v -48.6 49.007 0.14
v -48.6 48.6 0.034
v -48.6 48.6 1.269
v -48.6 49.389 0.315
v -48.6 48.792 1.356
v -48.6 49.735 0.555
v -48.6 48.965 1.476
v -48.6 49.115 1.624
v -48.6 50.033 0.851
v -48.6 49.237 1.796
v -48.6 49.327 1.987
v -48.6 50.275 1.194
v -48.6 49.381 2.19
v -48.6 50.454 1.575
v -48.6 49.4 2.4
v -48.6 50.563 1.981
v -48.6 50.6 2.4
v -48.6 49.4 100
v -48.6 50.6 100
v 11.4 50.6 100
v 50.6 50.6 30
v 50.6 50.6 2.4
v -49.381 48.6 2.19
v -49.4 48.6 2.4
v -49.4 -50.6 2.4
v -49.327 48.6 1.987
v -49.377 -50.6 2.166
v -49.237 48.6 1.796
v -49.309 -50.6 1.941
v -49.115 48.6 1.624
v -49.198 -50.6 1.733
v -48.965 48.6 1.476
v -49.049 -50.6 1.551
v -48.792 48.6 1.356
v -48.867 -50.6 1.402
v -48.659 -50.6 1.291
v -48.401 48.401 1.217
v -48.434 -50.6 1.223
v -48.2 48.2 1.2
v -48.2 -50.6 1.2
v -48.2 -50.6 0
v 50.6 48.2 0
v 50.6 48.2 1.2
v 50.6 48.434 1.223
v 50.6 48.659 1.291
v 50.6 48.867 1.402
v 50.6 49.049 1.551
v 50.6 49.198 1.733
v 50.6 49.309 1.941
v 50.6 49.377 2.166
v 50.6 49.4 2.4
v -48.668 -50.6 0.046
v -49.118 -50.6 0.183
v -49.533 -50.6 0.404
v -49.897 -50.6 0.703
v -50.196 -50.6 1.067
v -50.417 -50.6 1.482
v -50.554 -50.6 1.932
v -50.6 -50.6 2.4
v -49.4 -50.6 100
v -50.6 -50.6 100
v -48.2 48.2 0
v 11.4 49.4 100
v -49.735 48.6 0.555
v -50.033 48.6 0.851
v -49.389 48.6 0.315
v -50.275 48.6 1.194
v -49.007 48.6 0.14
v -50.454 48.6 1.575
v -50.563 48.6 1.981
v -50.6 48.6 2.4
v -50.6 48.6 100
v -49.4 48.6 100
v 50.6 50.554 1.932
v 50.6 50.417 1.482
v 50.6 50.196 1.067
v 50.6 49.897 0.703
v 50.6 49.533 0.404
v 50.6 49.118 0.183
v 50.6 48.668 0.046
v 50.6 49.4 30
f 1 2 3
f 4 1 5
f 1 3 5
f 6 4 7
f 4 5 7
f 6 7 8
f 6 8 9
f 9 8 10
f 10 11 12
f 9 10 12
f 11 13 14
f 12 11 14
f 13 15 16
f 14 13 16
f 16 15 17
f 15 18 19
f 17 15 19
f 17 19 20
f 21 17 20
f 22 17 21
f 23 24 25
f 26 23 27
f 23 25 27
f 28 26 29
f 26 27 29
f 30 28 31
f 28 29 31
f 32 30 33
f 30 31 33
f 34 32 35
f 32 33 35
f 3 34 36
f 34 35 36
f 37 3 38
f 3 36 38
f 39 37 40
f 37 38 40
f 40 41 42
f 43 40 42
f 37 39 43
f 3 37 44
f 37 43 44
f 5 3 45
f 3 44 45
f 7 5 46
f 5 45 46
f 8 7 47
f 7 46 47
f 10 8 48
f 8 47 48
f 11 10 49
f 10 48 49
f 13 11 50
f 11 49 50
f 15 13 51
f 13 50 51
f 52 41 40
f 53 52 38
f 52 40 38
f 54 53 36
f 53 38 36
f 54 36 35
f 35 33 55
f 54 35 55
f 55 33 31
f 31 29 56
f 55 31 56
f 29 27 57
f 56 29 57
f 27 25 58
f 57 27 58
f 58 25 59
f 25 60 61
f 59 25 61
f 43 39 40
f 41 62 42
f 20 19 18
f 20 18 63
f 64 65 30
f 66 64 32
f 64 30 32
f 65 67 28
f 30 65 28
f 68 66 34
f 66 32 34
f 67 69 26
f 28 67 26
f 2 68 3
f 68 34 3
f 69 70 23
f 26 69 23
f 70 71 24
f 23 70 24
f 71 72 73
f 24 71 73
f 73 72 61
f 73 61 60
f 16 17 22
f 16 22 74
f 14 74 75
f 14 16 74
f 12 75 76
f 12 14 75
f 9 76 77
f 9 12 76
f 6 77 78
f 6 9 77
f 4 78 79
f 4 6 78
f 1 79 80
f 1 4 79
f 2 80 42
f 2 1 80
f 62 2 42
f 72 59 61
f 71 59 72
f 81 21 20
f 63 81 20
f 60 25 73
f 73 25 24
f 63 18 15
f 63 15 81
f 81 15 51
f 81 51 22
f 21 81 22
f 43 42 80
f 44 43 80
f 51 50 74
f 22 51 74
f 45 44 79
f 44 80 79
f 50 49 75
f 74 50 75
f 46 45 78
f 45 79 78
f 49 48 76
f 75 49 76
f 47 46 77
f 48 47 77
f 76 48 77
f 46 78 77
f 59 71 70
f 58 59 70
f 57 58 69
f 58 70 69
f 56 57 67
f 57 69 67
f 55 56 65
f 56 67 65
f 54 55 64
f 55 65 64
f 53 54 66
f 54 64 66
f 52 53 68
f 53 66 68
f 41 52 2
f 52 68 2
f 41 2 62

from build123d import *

# Parameters (mm, degrees)
F0_W        = 101.2
F0_H        = 101.2
F1_DEPTH    = 100
F2_T        = -1.2
F4_W        = 0.8
F4_H        = 0.8
F5_DEPTH    = 100.001
F6_R        = 1.2
F7_T4_DEPTH = 101.8
F8_R        = 2.4
F9_T1_DEPTH = 110.8
F12_DEPTH   = 25
F14_DEPTH   = 25


# Not quite as in the source:
# - a fillet or chamfer that OpenCascade refuses, or shapes differently, is made with other operations: its cross-section is extruded or revolved along the edge and cut away or added


with BuildPart() as f1:
    # F0 (on Top) → F1 (new body)
    with BuildSketch(Plane.XY):
        Rectangle(F0_W, F0_H)
    extrude(amount=F1_DEPTH)

    # F2
    f2_openings = [f1.faces().sort_by_distance(p)[0] for p in [
        (0, 0, 100),
        (0, -50.6, 50),
        (50.6, 0, 50),
    ]]
    offset(amount=F2_T, openings=f2_openings)

    # F4 (on face) → F5 (cut, through all)
    with BuildSketch(Plane.XY.offset(100)):
        with Locations((-49, 49)):
            Rectangle(F4_W, F4_H)
        Polygon((-50.6, 50.6), (-50.6, 48.6), (-49.4, 48.6), (-49.4, 49.4), (-48.6, 49.4), (-48.6, 50.6), align=None)
    extrude(amount=-F5_DEPTH, mode=Mode.SUBTRACT)

    # F6
    f6_edges = [f1.edges().sort_by_distance(p)[0] for p in [
        (1, 49.4, 1.2),
    ]]
    fillet(f6_edges, radius=F6_R)

    # F7: fillet of radius 1.2 on 1 edges, made by hand


with BuildPart() as f7_tool2:
    # F7_s3 → F7_t4 (new body)
    with BuildSketch(Plane.XZ.offset(50.6)):
        with BuildLine():
            ThreePointArc((-49.4, 2.4), (-49.0485281374, 1.5514718626), (-48.2, 1.2))
            Line((-48.2, 1.2), (-49.4, 1.2))
            Line((-49.4, 1.2), (-49.4, 2.4))
        make_face()
    extrude(amount=-F7_T4_DEPTH)

    split(bisect_by=Plane.XZ.offset(-48.6), keep=Keep.TOP)


with BuildPart() as f1_1:
    add(f1.part)

    # F7_t1: union F7_tool2
    add(f7_tool2.part)

    # F8
    f8_edges = [f1_1.edges().sort_by_distance(p)[0] for p in [
        (-50.6, -1, 0),
    ]]
    fillet(f8_edges, radius=F8_R)

    # F9: fillet of radius 2.4 on 1 edges, made by hand

    # F9_s2 → F9_t1 (cut)
    with BuildSketch(Plane.YZ.offset(-54.2)):
        with BuildLine():
            ThreePointArc((50.6, 2.4), (49.8970562748, 0.7029437252), (48.2, 0))
            Line((48.2, 0), (50.6, 0))
            Line((50.6, 0), (50.6, 2.4))
        make_face()
    extrude(amount=F9_T1_DEPTH, mode=Mode.SUBTRACT)

    # F11 (on face) → F12 (cut)
    with BuildSketch(Plane(origin=(0, 50.6, 0), x_dir=(-1, 0, 0), z_dir=(0, 1, 0))):
        Polygon((-11.4, 100), (-50.6, 100), (-50.6, 30), align=None)
    extrude(amount=-F12_DEPTH, mode=Mode.SUBTRACT)

    # F13 (on face) → F14 (cut)
    with BuildSketch(Plane(origin=(0, 0, 0), x_dir=(1, 0, 0), z_dir=(0, 0, -1))):
        Polygon((50.6, -48.2), (50.6, 50.6), (-48.2, 50.6), align=None)
    extrude(amount=-F14_DEPTH, mode=Mode.SUBTRACT)


solid = f1_1.part
